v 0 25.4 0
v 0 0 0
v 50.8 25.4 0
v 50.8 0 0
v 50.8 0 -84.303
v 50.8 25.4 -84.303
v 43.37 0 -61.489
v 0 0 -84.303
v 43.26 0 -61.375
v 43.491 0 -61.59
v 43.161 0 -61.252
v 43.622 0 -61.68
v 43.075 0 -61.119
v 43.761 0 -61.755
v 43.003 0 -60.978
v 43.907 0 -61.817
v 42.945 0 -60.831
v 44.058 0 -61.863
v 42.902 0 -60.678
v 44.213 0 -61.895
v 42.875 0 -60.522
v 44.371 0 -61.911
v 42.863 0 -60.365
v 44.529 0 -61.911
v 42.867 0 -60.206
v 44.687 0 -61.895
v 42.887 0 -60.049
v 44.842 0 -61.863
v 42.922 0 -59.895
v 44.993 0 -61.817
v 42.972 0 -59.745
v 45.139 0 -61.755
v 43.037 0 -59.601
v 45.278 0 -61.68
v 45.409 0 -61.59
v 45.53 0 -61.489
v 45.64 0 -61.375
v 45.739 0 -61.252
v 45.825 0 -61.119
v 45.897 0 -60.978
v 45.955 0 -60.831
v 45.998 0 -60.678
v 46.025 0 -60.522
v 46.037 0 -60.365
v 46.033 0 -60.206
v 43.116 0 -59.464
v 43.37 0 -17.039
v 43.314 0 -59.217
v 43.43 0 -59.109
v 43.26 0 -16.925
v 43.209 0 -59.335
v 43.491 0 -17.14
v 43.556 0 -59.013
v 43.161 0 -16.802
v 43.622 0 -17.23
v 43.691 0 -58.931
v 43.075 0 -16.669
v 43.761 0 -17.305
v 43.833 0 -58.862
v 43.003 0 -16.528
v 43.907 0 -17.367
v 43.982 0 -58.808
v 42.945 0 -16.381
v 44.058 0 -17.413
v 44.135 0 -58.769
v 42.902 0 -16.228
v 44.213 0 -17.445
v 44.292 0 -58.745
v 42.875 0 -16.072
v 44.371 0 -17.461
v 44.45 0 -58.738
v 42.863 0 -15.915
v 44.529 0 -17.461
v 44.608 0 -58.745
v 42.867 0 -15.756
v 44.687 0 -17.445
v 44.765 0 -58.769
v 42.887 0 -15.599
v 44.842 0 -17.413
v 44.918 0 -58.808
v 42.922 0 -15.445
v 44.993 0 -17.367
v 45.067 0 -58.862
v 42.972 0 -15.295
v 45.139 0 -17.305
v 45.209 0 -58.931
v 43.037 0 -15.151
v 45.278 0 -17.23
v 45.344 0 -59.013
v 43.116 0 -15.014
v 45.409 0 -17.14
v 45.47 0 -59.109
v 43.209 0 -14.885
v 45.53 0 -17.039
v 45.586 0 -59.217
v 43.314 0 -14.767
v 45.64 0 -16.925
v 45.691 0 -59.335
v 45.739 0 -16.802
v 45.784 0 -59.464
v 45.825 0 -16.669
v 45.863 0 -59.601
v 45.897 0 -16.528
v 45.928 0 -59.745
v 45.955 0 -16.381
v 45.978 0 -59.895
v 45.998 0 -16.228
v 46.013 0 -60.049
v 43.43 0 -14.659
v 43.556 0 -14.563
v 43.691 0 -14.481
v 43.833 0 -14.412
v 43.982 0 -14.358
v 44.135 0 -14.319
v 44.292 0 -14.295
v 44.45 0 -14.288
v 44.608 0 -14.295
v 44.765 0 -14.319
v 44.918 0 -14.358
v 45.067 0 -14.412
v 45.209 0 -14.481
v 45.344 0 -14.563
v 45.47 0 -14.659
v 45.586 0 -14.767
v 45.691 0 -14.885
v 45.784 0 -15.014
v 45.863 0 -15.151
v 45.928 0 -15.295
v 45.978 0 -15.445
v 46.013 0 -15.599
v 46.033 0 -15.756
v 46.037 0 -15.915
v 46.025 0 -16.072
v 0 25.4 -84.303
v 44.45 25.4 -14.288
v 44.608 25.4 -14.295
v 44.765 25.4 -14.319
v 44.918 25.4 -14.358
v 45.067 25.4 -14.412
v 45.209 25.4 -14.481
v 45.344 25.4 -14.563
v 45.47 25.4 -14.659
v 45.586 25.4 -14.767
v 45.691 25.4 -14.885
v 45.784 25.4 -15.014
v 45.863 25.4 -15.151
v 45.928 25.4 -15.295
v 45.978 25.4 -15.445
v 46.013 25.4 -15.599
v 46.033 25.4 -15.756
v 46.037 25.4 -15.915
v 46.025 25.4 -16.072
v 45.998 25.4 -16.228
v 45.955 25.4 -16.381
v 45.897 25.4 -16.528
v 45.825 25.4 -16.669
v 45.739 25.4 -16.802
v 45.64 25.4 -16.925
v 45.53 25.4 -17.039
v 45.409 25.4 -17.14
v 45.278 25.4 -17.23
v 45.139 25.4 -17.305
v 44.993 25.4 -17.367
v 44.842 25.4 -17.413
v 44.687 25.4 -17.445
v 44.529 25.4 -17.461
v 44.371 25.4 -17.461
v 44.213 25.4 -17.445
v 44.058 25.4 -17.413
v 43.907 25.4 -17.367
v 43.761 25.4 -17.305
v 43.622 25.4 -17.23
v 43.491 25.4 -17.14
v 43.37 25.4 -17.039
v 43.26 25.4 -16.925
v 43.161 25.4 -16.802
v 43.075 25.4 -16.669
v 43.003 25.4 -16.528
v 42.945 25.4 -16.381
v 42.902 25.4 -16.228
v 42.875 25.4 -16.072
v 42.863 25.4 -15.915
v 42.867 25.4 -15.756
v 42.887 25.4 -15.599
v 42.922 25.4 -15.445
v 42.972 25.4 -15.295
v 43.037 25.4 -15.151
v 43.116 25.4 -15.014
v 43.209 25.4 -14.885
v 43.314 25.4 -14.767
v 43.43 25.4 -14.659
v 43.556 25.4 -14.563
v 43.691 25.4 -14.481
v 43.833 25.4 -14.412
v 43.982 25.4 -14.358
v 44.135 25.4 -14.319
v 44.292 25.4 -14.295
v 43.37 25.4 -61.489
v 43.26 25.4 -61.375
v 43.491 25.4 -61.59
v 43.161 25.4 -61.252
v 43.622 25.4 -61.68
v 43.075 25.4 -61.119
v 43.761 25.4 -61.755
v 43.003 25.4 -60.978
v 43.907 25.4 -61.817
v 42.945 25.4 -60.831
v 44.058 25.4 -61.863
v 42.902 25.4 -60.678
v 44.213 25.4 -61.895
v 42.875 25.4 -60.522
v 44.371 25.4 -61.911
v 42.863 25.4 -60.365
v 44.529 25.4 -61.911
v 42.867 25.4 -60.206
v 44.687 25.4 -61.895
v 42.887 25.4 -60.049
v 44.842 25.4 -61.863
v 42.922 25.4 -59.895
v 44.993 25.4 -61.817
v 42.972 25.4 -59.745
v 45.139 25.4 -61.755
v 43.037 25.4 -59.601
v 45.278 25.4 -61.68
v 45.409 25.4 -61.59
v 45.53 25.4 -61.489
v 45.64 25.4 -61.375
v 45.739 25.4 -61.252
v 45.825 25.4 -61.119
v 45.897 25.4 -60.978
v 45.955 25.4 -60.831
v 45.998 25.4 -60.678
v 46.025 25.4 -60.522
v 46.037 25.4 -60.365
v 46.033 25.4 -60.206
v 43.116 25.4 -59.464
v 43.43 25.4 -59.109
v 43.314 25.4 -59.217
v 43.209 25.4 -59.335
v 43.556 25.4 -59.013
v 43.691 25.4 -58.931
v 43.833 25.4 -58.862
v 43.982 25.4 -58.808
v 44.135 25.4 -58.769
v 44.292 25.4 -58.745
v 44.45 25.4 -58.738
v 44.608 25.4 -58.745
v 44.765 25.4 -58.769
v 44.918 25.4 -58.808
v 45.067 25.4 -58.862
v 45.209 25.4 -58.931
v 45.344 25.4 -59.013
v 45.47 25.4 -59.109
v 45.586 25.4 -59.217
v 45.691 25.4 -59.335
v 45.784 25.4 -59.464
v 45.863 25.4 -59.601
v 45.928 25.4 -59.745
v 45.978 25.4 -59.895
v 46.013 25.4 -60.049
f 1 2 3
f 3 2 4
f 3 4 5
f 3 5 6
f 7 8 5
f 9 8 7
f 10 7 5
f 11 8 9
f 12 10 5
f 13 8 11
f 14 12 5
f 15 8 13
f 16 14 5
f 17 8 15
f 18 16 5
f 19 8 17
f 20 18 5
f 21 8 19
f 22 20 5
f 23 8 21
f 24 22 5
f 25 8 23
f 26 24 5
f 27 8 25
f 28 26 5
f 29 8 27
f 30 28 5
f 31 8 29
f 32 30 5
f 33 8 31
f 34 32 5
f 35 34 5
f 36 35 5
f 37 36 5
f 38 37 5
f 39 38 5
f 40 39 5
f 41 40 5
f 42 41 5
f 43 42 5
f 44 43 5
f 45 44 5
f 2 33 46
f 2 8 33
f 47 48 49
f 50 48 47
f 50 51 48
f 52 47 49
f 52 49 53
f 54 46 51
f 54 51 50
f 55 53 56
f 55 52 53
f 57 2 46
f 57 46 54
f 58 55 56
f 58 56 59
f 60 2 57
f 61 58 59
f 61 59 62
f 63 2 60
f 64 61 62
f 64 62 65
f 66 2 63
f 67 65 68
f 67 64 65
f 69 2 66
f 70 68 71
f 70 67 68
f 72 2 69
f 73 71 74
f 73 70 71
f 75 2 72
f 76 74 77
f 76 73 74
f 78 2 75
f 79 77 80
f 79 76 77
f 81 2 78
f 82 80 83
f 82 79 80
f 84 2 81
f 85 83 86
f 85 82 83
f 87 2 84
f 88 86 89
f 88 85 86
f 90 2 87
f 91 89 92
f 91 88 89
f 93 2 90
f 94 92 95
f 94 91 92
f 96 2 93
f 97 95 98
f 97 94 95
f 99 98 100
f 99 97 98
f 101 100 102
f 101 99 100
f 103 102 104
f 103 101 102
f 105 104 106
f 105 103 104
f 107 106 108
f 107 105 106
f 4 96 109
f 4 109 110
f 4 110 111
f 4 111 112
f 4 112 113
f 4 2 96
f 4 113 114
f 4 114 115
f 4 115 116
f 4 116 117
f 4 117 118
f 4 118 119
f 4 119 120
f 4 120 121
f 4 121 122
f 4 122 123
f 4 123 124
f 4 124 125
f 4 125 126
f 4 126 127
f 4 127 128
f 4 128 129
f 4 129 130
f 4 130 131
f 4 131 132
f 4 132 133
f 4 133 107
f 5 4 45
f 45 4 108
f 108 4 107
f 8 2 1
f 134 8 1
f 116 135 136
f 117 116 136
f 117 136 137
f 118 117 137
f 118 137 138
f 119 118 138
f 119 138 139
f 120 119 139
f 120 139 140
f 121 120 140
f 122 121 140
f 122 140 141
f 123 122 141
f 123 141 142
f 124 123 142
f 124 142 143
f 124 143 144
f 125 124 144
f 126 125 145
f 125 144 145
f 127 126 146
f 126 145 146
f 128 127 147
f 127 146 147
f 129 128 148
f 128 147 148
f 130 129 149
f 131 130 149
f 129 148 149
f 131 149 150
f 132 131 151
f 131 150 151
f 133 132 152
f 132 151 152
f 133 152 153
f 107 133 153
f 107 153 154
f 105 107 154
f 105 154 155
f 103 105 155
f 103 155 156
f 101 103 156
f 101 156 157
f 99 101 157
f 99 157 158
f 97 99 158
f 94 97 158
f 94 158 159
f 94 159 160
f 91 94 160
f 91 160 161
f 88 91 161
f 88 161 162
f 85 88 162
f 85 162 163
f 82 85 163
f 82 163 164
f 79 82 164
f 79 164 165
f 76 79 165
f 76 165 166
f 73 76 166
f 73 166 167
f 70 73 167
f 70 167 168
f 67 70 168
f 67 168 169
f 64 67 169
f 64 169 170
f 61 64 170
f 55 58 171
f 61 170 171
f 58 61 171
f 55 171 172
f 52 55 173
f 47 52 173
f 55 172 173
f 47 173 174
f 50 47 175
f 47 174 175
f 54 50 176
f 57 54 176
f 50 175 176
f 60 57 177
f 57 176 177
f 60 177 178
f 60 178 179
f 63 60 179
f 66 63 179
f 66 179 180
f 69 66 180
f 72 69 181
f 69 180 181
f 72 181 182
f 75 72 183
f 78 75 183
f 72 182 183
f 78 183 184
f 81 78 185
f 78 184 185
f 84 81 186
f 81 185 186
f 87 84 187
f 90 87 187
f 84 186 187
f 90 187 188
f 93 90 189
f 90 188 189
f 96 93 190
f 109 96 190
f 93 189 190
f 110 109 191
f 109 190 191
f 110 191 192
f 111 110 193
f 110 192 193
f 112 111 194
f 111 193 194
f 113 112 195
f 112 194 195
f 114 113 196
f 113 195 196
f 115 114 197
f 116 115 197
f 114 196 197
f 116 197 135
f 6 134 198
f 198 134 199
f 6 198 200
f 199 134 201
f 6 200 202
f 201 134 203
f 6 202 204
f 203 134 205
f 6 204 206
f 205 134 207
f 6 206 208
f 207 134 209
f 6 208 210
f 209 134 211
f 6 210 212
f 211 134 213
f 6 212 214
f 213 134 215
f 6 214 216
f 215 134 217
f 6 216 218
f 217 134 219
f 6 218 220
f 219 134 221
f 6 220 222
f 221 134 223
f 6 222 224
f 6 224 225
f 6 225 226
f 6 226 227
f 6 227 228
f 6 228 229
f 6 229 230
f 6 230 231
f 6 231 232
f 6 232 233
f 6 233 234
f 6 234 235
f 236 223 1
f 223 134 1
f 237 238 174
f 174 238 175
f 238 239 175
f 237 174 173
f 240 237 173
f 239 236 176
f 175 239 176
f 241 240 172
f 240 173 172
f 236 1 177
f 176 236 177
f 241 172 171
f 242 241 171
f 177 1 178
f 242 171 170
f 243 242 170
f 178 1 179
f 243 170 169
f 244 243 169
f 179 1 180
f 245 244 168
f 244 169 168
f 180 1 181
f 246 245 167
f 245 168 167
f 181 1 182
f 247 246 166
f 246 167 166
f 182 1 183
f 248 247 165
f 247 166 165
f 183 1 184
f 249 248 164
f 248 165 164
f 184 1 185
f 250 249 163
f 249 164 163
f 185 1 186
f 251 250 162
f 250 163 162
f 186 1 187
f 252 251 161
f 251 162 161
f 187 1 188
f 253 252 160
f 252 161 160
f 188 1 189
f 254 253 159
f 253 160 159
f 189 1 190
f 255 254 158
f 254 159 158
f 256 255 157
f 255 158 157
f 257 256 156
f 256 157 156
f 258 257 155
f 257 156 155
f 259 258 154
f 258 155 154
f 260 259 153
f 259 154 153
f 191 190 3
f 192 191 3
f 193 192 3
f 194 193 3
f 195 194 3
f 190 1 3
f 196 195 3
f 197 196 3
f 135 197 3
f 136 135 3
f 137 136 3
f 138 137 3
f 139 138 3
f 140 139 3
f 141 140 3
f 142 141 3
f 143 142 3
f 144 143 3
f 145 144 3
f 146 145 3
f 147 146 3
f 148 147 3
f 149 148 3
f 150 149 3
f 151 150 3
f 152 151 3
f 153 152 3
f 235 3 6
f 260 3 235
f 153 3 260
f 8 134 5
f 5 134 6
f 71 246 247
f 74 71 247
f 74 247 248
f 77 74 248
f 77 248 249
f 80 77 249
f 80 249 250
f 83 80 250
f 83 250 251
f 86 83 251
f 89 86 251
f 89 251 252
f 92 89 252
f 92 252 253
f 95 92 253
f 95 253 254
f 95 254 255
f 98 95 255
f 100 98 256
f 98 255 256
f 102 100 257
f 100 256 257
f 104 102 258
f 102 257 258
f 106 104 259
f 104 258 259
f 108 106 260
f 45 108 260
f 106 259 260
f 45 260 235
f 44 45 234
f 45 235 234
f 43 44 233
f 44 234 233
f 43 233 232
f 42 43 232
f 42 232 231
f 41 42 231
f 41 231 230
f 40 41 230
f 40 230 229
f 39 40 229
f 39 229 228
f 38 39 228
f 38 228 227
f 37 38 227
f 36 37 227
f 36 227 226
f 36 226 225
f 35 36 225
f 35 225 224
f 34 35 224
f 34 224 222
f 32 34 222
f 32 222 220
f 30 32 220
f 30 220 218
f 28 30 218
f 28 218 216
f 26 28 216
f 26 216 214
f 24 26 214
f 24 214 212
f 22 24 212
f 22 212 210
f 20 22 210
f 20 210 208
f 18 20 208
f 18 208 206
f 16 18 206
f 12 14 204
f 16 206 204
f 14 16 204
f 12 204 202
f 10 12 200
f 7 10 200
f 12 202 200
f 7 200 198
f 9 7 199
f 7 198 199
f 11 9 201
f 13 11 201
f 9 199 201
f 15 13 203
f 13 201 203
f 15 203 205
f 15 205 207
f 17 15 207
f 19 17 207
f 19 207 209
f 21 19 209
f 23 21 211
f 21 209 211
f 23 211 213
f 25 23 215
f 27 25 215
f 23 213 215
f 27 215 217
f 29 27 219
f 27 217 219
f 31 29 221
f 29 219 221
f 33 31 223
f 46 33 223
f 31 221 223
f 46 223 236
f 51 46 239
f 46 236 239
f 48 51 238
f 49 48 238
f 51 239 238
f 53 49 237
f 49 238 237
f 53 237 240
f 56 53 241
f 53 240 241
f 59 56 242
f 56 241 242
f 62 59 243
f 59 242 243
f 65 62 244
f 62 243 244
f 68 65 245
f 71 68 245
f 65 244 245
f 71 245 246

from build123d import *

# Parameters (mm, degrees)
SKETCH1_W           = 50.8
SKETCH1_H           = 76.2
BOSS_EXTRUDE1_DEPTH = 25.4
SKETCH2_R           = 1.5875
CUT_EXTRUDE1_DEPTH  = 96.038097624
SKETCH3_W           = 50.8
SKETCH3_H           = 25.4
BOSS_EXTRUDE2_DEPTH = 8.1026


with BuildPart() as part:
    # Sketch1 → Boss-Extrude1 (new body)
    with BuildSketch(Plane(origin=(0, 0, 0), x_dir=(1, 0, 0), z_dir=(0, 1, 0))):
        with Locations((25.4, 38.1)):
            Rectangle(SKETCH1_W, SKETCH1_H)
    extrude(amount=BOSS_EXTRUDE1_DEPTH)

    # Sketch2 → Cut-Extrude1 (cut, through all)
    with BuildSketch(Plane(origin=(0, 25.4, 0), x_dir=(1, 0, 0), z_dir=(0, 1, 0))):
        with Locations(Location((44.45, 60.325, 0), (0, 0, 270))):
            Circle(SKETCH2_R)
        with Locations(Location((44.45, 15.875, 0), (0, 0, 270))):
            Circle(SKETCH2_R)
    extrude(amount=-CUT_EXTRUDE1_DEPTH, mode=Mode.SUBTRACT)

    # Sketch3 → Boss-Extrude2 (add)
    with BuildSketch(Plane.XY.offset(-76.2)):
        with Locations((25.4, 12.7)):
            Rectangle(SKETCH3_W, SKETCH3_H)
    extrude(amount=-BOSS_EXTRUDE2_DEPTH)


solid = part.part
